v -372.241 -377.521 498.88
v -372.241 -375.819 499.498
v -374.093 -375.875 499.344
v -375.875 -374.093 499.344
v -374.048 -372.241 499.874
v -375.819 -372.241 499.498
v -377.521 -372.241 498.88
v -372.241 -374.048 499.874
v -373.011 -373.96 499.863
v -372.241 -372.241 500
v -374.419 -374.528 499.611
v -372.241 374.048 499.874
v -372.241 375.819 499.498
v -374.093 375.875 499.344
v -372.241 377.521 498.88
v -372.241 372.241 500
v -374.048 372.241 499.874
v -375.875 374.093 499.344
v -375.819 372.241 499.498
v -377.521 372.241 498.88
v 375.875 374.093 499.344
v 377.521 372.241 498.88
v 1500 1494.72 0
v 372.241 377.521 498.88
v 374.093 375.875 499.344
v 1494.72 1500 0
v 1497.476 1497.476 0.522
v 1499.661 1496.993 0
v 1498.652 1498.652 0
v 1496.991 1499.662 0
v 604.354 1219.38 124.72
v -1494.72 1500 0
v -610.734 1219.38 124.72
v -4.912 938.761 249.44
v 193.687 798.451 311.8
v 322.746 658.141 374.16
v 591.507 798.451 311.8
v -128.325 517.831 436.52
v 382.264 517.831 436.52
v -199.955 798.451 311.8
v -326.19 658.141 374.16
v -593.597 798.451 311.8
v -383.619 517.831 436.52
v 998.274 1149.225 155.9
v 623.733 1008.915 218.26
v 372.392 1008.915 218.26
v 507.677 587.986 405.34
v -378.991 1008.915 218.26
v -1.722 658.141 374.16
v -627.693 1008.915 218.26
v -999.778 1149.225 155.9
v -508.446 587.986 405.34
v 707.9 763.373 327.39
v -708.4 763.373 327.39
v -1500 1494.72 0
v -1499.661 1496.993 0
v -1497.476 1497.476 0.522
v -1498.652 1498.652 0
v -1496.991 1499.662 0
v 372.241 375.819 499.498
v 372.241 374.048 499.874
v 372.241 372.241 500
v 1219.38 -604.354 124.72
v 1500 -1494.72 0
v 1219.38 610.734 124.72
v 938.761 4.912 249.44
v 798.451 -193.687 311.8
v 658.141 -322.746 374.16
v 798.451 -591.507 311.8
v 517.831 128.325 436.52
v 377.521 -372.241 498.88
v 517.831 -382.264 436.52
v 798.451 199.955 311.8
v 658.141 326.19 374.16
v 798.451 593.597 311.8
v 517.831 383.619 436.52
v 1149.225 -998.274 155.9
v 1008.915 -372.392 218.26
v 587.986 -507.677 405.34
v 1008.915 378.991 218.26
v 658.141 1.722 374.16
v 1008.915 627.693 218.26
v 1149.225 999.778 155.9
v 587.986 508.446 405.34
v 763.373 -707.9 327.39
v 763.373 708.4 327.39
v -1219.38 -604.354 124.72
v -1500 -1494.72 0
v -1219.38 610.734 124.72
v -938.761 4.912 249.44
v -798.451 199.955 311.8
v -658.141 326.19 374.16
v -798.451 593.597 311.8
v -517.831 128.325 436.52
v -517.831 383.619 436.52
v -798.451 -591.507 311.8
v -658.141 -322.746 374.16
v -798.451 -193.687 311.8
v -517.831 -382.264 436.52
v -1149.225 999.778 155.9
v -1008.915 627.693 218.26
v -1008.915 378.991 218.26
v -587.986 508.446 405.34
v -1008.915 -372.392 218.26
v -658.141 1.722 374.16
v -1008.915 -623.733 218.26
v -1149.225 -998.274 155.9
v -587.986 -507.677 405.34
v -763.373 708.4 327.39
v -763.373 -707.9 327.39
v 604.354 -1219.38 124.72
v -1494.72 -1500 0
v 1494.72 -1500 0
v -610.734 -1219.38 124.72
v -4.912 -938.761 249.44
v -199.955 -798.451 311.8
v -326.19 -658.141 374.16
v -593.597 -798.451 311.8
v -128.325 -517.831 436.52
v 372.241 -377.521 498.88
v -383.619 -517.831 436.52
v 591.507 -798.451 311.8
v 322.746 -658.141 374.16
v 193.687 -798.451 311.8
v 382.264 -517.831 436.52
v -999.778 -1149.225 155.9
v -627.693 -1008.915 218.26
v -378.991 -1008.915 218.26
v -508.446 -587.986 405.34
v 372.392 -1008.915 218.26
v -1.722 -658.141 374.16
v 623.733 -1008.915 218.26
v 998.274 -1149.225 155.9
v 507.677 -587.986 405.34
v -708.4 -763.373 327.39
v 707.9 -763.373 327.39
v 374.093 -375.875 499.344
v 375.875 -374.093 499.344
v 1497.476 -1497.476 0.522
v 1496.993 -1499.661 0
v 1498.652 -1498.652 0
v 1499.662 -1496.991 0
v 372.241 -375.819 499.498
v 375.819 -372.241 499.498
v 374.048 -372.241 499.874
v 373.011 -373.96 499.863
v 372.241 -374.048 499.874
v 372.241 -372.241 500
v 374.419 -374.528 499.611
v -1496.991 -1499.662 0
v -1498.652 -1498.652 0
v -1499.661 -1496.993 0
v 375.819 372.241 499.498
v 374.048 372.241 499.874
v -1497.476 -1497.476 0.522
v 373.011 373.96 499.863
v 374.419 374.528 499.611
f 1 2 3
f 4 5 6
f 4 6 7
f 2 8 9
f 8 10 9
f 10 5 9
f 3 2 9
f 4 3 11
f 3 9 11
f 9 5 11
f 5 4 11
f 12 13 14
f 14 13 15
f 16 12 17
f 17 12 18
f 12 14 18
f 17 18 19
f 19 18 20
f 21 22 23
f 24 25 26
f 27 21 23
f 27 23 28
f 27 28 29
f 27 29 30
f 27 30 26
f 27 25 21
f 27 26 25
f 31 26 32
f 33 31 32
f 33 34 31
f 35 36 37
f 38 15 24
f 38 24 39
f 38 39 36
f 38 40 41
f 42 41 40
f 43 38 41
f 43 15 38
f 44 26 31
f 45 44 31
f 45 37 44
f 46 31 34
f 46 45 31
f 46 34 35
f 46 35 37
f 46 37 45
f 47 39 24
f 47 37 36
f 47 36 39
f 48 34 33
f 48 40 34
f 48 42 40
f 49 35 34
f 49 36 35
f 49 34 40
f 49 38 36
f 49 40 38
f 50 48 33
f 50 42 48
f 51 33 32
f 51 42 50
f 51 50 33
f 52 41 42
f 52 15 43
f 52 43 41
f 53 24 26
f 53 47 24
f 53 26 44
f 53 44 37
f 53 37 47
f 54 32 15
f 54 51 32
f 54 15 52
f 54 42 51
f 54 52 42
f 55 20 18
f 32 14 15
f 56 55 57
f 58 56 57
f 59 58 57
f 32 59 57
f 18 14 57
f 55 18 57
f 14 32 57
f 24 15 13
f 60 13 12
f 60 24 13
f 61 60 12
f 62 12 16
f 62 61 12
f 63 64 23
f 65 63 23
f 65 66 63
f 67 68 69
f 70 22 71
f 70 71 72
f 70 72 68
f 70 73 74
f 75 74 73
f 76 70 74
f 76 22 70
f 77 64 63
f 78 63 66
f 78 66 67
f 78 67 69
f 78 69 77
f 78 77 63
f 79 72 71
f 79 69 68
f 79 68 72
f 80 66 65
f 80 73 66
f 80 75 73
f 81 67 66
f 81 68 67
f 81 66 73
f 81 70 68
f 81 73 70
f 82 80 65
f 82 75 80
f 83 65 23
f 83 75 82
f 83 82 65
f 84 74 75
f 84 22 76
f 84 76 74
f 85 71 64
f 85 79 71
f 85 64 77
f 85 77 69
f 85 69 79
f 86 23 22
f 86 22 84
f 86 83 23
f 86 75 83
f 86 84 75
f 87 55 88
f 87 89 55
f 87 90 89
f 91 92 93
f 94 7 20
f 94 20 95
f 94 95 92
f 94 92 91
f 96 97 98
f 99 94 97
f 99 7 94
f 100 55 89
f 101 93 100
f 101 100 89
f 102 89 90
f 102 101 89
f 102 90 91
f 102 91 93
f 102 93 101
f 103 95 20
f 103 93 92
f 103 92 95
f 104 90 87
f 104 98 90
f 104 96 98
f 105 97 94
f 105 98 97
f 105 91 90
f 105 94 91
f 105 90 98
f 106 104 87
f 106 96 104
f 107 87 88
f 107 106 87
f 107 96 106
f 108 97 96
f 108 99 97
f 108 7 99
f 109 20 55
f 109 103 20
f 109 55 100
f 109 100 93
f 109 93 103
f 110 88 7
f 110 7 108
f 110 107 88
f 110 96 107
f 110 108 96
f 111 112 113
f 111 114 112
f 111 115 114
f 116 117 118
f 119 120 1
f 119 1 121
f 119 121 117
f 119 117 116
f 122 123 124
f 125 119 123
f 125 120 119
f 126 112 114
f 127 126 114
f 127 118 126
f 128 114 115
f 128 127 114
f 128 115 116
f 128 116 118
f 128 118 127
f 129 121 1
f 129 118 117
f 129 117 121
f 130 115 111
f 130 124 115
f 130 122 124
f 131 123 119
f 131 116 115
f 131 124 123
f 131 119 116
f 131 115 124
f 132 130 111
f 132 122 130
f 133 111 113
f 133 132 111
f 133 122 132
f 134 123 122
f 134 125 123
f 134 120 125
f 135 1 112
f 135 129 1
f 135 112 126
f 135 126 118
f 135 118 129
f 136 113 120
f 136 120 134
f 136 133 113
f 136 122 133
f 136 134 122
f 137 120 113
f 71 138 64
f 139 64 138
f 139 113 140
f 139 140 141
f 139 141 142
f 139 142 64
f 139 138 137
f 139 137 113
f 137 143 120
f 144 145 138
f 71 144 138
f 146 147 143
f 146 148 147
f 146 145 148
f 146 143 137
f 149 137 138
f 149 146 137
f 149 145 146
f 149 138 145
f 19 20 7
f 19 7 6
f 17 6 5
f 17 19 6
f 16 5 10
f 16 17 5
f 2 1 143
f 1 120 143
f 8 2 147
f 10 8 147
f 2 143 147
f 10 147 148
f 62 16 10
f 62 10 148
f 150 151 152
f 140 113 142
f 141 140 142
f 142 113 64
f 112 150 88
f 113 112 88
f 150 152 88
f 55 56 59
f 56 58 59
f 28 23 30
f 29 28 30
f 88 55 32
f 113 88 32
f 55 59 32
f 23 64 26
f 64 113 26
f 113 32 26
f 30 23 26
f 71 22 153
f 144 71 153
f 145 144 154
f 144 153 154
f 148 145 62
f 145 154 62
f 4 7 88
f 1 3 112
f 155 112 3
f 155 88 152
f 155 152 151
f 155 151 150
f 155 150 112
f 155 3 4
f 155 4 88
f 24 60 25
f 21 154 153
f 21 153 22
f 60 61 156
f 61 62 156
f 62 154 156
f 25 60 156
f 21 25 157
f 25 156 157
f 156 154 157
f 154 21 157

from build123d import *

# Parameters (mm, degrees)
F0_W = 3000
F0_H = 3000
F2_W = 750
F2_H = 750
F4_R = 13


with BuildPart() as f3:
    # F0 (on Top) → F3 section 0
    with BuildSketch(Plane.XY):
        Rectangle(F0_W, F0_H)
    # F2 (on offset) → F3 section 1
    with BuildSketch(Plane.XY.offset(500)):
        Rectangle(F2_W, F2_H)
    loft()

    # F4
    f4_edges = [f3.edges().sort_by_distance(p)[0] for p in [
        (-937.5, 937.5, 250),
        (375, 0, 500),
        (0, 375, 500),
        (-375, 0, 500),
        (0, -375, 500),
        (-937.5, -937.5, 250),
        (937.5, -937.5, 250),
        (937.5, 937.5, 250),
    ]]
    fillet(f4_edges, radius=F4_R)


solid = f3.part
